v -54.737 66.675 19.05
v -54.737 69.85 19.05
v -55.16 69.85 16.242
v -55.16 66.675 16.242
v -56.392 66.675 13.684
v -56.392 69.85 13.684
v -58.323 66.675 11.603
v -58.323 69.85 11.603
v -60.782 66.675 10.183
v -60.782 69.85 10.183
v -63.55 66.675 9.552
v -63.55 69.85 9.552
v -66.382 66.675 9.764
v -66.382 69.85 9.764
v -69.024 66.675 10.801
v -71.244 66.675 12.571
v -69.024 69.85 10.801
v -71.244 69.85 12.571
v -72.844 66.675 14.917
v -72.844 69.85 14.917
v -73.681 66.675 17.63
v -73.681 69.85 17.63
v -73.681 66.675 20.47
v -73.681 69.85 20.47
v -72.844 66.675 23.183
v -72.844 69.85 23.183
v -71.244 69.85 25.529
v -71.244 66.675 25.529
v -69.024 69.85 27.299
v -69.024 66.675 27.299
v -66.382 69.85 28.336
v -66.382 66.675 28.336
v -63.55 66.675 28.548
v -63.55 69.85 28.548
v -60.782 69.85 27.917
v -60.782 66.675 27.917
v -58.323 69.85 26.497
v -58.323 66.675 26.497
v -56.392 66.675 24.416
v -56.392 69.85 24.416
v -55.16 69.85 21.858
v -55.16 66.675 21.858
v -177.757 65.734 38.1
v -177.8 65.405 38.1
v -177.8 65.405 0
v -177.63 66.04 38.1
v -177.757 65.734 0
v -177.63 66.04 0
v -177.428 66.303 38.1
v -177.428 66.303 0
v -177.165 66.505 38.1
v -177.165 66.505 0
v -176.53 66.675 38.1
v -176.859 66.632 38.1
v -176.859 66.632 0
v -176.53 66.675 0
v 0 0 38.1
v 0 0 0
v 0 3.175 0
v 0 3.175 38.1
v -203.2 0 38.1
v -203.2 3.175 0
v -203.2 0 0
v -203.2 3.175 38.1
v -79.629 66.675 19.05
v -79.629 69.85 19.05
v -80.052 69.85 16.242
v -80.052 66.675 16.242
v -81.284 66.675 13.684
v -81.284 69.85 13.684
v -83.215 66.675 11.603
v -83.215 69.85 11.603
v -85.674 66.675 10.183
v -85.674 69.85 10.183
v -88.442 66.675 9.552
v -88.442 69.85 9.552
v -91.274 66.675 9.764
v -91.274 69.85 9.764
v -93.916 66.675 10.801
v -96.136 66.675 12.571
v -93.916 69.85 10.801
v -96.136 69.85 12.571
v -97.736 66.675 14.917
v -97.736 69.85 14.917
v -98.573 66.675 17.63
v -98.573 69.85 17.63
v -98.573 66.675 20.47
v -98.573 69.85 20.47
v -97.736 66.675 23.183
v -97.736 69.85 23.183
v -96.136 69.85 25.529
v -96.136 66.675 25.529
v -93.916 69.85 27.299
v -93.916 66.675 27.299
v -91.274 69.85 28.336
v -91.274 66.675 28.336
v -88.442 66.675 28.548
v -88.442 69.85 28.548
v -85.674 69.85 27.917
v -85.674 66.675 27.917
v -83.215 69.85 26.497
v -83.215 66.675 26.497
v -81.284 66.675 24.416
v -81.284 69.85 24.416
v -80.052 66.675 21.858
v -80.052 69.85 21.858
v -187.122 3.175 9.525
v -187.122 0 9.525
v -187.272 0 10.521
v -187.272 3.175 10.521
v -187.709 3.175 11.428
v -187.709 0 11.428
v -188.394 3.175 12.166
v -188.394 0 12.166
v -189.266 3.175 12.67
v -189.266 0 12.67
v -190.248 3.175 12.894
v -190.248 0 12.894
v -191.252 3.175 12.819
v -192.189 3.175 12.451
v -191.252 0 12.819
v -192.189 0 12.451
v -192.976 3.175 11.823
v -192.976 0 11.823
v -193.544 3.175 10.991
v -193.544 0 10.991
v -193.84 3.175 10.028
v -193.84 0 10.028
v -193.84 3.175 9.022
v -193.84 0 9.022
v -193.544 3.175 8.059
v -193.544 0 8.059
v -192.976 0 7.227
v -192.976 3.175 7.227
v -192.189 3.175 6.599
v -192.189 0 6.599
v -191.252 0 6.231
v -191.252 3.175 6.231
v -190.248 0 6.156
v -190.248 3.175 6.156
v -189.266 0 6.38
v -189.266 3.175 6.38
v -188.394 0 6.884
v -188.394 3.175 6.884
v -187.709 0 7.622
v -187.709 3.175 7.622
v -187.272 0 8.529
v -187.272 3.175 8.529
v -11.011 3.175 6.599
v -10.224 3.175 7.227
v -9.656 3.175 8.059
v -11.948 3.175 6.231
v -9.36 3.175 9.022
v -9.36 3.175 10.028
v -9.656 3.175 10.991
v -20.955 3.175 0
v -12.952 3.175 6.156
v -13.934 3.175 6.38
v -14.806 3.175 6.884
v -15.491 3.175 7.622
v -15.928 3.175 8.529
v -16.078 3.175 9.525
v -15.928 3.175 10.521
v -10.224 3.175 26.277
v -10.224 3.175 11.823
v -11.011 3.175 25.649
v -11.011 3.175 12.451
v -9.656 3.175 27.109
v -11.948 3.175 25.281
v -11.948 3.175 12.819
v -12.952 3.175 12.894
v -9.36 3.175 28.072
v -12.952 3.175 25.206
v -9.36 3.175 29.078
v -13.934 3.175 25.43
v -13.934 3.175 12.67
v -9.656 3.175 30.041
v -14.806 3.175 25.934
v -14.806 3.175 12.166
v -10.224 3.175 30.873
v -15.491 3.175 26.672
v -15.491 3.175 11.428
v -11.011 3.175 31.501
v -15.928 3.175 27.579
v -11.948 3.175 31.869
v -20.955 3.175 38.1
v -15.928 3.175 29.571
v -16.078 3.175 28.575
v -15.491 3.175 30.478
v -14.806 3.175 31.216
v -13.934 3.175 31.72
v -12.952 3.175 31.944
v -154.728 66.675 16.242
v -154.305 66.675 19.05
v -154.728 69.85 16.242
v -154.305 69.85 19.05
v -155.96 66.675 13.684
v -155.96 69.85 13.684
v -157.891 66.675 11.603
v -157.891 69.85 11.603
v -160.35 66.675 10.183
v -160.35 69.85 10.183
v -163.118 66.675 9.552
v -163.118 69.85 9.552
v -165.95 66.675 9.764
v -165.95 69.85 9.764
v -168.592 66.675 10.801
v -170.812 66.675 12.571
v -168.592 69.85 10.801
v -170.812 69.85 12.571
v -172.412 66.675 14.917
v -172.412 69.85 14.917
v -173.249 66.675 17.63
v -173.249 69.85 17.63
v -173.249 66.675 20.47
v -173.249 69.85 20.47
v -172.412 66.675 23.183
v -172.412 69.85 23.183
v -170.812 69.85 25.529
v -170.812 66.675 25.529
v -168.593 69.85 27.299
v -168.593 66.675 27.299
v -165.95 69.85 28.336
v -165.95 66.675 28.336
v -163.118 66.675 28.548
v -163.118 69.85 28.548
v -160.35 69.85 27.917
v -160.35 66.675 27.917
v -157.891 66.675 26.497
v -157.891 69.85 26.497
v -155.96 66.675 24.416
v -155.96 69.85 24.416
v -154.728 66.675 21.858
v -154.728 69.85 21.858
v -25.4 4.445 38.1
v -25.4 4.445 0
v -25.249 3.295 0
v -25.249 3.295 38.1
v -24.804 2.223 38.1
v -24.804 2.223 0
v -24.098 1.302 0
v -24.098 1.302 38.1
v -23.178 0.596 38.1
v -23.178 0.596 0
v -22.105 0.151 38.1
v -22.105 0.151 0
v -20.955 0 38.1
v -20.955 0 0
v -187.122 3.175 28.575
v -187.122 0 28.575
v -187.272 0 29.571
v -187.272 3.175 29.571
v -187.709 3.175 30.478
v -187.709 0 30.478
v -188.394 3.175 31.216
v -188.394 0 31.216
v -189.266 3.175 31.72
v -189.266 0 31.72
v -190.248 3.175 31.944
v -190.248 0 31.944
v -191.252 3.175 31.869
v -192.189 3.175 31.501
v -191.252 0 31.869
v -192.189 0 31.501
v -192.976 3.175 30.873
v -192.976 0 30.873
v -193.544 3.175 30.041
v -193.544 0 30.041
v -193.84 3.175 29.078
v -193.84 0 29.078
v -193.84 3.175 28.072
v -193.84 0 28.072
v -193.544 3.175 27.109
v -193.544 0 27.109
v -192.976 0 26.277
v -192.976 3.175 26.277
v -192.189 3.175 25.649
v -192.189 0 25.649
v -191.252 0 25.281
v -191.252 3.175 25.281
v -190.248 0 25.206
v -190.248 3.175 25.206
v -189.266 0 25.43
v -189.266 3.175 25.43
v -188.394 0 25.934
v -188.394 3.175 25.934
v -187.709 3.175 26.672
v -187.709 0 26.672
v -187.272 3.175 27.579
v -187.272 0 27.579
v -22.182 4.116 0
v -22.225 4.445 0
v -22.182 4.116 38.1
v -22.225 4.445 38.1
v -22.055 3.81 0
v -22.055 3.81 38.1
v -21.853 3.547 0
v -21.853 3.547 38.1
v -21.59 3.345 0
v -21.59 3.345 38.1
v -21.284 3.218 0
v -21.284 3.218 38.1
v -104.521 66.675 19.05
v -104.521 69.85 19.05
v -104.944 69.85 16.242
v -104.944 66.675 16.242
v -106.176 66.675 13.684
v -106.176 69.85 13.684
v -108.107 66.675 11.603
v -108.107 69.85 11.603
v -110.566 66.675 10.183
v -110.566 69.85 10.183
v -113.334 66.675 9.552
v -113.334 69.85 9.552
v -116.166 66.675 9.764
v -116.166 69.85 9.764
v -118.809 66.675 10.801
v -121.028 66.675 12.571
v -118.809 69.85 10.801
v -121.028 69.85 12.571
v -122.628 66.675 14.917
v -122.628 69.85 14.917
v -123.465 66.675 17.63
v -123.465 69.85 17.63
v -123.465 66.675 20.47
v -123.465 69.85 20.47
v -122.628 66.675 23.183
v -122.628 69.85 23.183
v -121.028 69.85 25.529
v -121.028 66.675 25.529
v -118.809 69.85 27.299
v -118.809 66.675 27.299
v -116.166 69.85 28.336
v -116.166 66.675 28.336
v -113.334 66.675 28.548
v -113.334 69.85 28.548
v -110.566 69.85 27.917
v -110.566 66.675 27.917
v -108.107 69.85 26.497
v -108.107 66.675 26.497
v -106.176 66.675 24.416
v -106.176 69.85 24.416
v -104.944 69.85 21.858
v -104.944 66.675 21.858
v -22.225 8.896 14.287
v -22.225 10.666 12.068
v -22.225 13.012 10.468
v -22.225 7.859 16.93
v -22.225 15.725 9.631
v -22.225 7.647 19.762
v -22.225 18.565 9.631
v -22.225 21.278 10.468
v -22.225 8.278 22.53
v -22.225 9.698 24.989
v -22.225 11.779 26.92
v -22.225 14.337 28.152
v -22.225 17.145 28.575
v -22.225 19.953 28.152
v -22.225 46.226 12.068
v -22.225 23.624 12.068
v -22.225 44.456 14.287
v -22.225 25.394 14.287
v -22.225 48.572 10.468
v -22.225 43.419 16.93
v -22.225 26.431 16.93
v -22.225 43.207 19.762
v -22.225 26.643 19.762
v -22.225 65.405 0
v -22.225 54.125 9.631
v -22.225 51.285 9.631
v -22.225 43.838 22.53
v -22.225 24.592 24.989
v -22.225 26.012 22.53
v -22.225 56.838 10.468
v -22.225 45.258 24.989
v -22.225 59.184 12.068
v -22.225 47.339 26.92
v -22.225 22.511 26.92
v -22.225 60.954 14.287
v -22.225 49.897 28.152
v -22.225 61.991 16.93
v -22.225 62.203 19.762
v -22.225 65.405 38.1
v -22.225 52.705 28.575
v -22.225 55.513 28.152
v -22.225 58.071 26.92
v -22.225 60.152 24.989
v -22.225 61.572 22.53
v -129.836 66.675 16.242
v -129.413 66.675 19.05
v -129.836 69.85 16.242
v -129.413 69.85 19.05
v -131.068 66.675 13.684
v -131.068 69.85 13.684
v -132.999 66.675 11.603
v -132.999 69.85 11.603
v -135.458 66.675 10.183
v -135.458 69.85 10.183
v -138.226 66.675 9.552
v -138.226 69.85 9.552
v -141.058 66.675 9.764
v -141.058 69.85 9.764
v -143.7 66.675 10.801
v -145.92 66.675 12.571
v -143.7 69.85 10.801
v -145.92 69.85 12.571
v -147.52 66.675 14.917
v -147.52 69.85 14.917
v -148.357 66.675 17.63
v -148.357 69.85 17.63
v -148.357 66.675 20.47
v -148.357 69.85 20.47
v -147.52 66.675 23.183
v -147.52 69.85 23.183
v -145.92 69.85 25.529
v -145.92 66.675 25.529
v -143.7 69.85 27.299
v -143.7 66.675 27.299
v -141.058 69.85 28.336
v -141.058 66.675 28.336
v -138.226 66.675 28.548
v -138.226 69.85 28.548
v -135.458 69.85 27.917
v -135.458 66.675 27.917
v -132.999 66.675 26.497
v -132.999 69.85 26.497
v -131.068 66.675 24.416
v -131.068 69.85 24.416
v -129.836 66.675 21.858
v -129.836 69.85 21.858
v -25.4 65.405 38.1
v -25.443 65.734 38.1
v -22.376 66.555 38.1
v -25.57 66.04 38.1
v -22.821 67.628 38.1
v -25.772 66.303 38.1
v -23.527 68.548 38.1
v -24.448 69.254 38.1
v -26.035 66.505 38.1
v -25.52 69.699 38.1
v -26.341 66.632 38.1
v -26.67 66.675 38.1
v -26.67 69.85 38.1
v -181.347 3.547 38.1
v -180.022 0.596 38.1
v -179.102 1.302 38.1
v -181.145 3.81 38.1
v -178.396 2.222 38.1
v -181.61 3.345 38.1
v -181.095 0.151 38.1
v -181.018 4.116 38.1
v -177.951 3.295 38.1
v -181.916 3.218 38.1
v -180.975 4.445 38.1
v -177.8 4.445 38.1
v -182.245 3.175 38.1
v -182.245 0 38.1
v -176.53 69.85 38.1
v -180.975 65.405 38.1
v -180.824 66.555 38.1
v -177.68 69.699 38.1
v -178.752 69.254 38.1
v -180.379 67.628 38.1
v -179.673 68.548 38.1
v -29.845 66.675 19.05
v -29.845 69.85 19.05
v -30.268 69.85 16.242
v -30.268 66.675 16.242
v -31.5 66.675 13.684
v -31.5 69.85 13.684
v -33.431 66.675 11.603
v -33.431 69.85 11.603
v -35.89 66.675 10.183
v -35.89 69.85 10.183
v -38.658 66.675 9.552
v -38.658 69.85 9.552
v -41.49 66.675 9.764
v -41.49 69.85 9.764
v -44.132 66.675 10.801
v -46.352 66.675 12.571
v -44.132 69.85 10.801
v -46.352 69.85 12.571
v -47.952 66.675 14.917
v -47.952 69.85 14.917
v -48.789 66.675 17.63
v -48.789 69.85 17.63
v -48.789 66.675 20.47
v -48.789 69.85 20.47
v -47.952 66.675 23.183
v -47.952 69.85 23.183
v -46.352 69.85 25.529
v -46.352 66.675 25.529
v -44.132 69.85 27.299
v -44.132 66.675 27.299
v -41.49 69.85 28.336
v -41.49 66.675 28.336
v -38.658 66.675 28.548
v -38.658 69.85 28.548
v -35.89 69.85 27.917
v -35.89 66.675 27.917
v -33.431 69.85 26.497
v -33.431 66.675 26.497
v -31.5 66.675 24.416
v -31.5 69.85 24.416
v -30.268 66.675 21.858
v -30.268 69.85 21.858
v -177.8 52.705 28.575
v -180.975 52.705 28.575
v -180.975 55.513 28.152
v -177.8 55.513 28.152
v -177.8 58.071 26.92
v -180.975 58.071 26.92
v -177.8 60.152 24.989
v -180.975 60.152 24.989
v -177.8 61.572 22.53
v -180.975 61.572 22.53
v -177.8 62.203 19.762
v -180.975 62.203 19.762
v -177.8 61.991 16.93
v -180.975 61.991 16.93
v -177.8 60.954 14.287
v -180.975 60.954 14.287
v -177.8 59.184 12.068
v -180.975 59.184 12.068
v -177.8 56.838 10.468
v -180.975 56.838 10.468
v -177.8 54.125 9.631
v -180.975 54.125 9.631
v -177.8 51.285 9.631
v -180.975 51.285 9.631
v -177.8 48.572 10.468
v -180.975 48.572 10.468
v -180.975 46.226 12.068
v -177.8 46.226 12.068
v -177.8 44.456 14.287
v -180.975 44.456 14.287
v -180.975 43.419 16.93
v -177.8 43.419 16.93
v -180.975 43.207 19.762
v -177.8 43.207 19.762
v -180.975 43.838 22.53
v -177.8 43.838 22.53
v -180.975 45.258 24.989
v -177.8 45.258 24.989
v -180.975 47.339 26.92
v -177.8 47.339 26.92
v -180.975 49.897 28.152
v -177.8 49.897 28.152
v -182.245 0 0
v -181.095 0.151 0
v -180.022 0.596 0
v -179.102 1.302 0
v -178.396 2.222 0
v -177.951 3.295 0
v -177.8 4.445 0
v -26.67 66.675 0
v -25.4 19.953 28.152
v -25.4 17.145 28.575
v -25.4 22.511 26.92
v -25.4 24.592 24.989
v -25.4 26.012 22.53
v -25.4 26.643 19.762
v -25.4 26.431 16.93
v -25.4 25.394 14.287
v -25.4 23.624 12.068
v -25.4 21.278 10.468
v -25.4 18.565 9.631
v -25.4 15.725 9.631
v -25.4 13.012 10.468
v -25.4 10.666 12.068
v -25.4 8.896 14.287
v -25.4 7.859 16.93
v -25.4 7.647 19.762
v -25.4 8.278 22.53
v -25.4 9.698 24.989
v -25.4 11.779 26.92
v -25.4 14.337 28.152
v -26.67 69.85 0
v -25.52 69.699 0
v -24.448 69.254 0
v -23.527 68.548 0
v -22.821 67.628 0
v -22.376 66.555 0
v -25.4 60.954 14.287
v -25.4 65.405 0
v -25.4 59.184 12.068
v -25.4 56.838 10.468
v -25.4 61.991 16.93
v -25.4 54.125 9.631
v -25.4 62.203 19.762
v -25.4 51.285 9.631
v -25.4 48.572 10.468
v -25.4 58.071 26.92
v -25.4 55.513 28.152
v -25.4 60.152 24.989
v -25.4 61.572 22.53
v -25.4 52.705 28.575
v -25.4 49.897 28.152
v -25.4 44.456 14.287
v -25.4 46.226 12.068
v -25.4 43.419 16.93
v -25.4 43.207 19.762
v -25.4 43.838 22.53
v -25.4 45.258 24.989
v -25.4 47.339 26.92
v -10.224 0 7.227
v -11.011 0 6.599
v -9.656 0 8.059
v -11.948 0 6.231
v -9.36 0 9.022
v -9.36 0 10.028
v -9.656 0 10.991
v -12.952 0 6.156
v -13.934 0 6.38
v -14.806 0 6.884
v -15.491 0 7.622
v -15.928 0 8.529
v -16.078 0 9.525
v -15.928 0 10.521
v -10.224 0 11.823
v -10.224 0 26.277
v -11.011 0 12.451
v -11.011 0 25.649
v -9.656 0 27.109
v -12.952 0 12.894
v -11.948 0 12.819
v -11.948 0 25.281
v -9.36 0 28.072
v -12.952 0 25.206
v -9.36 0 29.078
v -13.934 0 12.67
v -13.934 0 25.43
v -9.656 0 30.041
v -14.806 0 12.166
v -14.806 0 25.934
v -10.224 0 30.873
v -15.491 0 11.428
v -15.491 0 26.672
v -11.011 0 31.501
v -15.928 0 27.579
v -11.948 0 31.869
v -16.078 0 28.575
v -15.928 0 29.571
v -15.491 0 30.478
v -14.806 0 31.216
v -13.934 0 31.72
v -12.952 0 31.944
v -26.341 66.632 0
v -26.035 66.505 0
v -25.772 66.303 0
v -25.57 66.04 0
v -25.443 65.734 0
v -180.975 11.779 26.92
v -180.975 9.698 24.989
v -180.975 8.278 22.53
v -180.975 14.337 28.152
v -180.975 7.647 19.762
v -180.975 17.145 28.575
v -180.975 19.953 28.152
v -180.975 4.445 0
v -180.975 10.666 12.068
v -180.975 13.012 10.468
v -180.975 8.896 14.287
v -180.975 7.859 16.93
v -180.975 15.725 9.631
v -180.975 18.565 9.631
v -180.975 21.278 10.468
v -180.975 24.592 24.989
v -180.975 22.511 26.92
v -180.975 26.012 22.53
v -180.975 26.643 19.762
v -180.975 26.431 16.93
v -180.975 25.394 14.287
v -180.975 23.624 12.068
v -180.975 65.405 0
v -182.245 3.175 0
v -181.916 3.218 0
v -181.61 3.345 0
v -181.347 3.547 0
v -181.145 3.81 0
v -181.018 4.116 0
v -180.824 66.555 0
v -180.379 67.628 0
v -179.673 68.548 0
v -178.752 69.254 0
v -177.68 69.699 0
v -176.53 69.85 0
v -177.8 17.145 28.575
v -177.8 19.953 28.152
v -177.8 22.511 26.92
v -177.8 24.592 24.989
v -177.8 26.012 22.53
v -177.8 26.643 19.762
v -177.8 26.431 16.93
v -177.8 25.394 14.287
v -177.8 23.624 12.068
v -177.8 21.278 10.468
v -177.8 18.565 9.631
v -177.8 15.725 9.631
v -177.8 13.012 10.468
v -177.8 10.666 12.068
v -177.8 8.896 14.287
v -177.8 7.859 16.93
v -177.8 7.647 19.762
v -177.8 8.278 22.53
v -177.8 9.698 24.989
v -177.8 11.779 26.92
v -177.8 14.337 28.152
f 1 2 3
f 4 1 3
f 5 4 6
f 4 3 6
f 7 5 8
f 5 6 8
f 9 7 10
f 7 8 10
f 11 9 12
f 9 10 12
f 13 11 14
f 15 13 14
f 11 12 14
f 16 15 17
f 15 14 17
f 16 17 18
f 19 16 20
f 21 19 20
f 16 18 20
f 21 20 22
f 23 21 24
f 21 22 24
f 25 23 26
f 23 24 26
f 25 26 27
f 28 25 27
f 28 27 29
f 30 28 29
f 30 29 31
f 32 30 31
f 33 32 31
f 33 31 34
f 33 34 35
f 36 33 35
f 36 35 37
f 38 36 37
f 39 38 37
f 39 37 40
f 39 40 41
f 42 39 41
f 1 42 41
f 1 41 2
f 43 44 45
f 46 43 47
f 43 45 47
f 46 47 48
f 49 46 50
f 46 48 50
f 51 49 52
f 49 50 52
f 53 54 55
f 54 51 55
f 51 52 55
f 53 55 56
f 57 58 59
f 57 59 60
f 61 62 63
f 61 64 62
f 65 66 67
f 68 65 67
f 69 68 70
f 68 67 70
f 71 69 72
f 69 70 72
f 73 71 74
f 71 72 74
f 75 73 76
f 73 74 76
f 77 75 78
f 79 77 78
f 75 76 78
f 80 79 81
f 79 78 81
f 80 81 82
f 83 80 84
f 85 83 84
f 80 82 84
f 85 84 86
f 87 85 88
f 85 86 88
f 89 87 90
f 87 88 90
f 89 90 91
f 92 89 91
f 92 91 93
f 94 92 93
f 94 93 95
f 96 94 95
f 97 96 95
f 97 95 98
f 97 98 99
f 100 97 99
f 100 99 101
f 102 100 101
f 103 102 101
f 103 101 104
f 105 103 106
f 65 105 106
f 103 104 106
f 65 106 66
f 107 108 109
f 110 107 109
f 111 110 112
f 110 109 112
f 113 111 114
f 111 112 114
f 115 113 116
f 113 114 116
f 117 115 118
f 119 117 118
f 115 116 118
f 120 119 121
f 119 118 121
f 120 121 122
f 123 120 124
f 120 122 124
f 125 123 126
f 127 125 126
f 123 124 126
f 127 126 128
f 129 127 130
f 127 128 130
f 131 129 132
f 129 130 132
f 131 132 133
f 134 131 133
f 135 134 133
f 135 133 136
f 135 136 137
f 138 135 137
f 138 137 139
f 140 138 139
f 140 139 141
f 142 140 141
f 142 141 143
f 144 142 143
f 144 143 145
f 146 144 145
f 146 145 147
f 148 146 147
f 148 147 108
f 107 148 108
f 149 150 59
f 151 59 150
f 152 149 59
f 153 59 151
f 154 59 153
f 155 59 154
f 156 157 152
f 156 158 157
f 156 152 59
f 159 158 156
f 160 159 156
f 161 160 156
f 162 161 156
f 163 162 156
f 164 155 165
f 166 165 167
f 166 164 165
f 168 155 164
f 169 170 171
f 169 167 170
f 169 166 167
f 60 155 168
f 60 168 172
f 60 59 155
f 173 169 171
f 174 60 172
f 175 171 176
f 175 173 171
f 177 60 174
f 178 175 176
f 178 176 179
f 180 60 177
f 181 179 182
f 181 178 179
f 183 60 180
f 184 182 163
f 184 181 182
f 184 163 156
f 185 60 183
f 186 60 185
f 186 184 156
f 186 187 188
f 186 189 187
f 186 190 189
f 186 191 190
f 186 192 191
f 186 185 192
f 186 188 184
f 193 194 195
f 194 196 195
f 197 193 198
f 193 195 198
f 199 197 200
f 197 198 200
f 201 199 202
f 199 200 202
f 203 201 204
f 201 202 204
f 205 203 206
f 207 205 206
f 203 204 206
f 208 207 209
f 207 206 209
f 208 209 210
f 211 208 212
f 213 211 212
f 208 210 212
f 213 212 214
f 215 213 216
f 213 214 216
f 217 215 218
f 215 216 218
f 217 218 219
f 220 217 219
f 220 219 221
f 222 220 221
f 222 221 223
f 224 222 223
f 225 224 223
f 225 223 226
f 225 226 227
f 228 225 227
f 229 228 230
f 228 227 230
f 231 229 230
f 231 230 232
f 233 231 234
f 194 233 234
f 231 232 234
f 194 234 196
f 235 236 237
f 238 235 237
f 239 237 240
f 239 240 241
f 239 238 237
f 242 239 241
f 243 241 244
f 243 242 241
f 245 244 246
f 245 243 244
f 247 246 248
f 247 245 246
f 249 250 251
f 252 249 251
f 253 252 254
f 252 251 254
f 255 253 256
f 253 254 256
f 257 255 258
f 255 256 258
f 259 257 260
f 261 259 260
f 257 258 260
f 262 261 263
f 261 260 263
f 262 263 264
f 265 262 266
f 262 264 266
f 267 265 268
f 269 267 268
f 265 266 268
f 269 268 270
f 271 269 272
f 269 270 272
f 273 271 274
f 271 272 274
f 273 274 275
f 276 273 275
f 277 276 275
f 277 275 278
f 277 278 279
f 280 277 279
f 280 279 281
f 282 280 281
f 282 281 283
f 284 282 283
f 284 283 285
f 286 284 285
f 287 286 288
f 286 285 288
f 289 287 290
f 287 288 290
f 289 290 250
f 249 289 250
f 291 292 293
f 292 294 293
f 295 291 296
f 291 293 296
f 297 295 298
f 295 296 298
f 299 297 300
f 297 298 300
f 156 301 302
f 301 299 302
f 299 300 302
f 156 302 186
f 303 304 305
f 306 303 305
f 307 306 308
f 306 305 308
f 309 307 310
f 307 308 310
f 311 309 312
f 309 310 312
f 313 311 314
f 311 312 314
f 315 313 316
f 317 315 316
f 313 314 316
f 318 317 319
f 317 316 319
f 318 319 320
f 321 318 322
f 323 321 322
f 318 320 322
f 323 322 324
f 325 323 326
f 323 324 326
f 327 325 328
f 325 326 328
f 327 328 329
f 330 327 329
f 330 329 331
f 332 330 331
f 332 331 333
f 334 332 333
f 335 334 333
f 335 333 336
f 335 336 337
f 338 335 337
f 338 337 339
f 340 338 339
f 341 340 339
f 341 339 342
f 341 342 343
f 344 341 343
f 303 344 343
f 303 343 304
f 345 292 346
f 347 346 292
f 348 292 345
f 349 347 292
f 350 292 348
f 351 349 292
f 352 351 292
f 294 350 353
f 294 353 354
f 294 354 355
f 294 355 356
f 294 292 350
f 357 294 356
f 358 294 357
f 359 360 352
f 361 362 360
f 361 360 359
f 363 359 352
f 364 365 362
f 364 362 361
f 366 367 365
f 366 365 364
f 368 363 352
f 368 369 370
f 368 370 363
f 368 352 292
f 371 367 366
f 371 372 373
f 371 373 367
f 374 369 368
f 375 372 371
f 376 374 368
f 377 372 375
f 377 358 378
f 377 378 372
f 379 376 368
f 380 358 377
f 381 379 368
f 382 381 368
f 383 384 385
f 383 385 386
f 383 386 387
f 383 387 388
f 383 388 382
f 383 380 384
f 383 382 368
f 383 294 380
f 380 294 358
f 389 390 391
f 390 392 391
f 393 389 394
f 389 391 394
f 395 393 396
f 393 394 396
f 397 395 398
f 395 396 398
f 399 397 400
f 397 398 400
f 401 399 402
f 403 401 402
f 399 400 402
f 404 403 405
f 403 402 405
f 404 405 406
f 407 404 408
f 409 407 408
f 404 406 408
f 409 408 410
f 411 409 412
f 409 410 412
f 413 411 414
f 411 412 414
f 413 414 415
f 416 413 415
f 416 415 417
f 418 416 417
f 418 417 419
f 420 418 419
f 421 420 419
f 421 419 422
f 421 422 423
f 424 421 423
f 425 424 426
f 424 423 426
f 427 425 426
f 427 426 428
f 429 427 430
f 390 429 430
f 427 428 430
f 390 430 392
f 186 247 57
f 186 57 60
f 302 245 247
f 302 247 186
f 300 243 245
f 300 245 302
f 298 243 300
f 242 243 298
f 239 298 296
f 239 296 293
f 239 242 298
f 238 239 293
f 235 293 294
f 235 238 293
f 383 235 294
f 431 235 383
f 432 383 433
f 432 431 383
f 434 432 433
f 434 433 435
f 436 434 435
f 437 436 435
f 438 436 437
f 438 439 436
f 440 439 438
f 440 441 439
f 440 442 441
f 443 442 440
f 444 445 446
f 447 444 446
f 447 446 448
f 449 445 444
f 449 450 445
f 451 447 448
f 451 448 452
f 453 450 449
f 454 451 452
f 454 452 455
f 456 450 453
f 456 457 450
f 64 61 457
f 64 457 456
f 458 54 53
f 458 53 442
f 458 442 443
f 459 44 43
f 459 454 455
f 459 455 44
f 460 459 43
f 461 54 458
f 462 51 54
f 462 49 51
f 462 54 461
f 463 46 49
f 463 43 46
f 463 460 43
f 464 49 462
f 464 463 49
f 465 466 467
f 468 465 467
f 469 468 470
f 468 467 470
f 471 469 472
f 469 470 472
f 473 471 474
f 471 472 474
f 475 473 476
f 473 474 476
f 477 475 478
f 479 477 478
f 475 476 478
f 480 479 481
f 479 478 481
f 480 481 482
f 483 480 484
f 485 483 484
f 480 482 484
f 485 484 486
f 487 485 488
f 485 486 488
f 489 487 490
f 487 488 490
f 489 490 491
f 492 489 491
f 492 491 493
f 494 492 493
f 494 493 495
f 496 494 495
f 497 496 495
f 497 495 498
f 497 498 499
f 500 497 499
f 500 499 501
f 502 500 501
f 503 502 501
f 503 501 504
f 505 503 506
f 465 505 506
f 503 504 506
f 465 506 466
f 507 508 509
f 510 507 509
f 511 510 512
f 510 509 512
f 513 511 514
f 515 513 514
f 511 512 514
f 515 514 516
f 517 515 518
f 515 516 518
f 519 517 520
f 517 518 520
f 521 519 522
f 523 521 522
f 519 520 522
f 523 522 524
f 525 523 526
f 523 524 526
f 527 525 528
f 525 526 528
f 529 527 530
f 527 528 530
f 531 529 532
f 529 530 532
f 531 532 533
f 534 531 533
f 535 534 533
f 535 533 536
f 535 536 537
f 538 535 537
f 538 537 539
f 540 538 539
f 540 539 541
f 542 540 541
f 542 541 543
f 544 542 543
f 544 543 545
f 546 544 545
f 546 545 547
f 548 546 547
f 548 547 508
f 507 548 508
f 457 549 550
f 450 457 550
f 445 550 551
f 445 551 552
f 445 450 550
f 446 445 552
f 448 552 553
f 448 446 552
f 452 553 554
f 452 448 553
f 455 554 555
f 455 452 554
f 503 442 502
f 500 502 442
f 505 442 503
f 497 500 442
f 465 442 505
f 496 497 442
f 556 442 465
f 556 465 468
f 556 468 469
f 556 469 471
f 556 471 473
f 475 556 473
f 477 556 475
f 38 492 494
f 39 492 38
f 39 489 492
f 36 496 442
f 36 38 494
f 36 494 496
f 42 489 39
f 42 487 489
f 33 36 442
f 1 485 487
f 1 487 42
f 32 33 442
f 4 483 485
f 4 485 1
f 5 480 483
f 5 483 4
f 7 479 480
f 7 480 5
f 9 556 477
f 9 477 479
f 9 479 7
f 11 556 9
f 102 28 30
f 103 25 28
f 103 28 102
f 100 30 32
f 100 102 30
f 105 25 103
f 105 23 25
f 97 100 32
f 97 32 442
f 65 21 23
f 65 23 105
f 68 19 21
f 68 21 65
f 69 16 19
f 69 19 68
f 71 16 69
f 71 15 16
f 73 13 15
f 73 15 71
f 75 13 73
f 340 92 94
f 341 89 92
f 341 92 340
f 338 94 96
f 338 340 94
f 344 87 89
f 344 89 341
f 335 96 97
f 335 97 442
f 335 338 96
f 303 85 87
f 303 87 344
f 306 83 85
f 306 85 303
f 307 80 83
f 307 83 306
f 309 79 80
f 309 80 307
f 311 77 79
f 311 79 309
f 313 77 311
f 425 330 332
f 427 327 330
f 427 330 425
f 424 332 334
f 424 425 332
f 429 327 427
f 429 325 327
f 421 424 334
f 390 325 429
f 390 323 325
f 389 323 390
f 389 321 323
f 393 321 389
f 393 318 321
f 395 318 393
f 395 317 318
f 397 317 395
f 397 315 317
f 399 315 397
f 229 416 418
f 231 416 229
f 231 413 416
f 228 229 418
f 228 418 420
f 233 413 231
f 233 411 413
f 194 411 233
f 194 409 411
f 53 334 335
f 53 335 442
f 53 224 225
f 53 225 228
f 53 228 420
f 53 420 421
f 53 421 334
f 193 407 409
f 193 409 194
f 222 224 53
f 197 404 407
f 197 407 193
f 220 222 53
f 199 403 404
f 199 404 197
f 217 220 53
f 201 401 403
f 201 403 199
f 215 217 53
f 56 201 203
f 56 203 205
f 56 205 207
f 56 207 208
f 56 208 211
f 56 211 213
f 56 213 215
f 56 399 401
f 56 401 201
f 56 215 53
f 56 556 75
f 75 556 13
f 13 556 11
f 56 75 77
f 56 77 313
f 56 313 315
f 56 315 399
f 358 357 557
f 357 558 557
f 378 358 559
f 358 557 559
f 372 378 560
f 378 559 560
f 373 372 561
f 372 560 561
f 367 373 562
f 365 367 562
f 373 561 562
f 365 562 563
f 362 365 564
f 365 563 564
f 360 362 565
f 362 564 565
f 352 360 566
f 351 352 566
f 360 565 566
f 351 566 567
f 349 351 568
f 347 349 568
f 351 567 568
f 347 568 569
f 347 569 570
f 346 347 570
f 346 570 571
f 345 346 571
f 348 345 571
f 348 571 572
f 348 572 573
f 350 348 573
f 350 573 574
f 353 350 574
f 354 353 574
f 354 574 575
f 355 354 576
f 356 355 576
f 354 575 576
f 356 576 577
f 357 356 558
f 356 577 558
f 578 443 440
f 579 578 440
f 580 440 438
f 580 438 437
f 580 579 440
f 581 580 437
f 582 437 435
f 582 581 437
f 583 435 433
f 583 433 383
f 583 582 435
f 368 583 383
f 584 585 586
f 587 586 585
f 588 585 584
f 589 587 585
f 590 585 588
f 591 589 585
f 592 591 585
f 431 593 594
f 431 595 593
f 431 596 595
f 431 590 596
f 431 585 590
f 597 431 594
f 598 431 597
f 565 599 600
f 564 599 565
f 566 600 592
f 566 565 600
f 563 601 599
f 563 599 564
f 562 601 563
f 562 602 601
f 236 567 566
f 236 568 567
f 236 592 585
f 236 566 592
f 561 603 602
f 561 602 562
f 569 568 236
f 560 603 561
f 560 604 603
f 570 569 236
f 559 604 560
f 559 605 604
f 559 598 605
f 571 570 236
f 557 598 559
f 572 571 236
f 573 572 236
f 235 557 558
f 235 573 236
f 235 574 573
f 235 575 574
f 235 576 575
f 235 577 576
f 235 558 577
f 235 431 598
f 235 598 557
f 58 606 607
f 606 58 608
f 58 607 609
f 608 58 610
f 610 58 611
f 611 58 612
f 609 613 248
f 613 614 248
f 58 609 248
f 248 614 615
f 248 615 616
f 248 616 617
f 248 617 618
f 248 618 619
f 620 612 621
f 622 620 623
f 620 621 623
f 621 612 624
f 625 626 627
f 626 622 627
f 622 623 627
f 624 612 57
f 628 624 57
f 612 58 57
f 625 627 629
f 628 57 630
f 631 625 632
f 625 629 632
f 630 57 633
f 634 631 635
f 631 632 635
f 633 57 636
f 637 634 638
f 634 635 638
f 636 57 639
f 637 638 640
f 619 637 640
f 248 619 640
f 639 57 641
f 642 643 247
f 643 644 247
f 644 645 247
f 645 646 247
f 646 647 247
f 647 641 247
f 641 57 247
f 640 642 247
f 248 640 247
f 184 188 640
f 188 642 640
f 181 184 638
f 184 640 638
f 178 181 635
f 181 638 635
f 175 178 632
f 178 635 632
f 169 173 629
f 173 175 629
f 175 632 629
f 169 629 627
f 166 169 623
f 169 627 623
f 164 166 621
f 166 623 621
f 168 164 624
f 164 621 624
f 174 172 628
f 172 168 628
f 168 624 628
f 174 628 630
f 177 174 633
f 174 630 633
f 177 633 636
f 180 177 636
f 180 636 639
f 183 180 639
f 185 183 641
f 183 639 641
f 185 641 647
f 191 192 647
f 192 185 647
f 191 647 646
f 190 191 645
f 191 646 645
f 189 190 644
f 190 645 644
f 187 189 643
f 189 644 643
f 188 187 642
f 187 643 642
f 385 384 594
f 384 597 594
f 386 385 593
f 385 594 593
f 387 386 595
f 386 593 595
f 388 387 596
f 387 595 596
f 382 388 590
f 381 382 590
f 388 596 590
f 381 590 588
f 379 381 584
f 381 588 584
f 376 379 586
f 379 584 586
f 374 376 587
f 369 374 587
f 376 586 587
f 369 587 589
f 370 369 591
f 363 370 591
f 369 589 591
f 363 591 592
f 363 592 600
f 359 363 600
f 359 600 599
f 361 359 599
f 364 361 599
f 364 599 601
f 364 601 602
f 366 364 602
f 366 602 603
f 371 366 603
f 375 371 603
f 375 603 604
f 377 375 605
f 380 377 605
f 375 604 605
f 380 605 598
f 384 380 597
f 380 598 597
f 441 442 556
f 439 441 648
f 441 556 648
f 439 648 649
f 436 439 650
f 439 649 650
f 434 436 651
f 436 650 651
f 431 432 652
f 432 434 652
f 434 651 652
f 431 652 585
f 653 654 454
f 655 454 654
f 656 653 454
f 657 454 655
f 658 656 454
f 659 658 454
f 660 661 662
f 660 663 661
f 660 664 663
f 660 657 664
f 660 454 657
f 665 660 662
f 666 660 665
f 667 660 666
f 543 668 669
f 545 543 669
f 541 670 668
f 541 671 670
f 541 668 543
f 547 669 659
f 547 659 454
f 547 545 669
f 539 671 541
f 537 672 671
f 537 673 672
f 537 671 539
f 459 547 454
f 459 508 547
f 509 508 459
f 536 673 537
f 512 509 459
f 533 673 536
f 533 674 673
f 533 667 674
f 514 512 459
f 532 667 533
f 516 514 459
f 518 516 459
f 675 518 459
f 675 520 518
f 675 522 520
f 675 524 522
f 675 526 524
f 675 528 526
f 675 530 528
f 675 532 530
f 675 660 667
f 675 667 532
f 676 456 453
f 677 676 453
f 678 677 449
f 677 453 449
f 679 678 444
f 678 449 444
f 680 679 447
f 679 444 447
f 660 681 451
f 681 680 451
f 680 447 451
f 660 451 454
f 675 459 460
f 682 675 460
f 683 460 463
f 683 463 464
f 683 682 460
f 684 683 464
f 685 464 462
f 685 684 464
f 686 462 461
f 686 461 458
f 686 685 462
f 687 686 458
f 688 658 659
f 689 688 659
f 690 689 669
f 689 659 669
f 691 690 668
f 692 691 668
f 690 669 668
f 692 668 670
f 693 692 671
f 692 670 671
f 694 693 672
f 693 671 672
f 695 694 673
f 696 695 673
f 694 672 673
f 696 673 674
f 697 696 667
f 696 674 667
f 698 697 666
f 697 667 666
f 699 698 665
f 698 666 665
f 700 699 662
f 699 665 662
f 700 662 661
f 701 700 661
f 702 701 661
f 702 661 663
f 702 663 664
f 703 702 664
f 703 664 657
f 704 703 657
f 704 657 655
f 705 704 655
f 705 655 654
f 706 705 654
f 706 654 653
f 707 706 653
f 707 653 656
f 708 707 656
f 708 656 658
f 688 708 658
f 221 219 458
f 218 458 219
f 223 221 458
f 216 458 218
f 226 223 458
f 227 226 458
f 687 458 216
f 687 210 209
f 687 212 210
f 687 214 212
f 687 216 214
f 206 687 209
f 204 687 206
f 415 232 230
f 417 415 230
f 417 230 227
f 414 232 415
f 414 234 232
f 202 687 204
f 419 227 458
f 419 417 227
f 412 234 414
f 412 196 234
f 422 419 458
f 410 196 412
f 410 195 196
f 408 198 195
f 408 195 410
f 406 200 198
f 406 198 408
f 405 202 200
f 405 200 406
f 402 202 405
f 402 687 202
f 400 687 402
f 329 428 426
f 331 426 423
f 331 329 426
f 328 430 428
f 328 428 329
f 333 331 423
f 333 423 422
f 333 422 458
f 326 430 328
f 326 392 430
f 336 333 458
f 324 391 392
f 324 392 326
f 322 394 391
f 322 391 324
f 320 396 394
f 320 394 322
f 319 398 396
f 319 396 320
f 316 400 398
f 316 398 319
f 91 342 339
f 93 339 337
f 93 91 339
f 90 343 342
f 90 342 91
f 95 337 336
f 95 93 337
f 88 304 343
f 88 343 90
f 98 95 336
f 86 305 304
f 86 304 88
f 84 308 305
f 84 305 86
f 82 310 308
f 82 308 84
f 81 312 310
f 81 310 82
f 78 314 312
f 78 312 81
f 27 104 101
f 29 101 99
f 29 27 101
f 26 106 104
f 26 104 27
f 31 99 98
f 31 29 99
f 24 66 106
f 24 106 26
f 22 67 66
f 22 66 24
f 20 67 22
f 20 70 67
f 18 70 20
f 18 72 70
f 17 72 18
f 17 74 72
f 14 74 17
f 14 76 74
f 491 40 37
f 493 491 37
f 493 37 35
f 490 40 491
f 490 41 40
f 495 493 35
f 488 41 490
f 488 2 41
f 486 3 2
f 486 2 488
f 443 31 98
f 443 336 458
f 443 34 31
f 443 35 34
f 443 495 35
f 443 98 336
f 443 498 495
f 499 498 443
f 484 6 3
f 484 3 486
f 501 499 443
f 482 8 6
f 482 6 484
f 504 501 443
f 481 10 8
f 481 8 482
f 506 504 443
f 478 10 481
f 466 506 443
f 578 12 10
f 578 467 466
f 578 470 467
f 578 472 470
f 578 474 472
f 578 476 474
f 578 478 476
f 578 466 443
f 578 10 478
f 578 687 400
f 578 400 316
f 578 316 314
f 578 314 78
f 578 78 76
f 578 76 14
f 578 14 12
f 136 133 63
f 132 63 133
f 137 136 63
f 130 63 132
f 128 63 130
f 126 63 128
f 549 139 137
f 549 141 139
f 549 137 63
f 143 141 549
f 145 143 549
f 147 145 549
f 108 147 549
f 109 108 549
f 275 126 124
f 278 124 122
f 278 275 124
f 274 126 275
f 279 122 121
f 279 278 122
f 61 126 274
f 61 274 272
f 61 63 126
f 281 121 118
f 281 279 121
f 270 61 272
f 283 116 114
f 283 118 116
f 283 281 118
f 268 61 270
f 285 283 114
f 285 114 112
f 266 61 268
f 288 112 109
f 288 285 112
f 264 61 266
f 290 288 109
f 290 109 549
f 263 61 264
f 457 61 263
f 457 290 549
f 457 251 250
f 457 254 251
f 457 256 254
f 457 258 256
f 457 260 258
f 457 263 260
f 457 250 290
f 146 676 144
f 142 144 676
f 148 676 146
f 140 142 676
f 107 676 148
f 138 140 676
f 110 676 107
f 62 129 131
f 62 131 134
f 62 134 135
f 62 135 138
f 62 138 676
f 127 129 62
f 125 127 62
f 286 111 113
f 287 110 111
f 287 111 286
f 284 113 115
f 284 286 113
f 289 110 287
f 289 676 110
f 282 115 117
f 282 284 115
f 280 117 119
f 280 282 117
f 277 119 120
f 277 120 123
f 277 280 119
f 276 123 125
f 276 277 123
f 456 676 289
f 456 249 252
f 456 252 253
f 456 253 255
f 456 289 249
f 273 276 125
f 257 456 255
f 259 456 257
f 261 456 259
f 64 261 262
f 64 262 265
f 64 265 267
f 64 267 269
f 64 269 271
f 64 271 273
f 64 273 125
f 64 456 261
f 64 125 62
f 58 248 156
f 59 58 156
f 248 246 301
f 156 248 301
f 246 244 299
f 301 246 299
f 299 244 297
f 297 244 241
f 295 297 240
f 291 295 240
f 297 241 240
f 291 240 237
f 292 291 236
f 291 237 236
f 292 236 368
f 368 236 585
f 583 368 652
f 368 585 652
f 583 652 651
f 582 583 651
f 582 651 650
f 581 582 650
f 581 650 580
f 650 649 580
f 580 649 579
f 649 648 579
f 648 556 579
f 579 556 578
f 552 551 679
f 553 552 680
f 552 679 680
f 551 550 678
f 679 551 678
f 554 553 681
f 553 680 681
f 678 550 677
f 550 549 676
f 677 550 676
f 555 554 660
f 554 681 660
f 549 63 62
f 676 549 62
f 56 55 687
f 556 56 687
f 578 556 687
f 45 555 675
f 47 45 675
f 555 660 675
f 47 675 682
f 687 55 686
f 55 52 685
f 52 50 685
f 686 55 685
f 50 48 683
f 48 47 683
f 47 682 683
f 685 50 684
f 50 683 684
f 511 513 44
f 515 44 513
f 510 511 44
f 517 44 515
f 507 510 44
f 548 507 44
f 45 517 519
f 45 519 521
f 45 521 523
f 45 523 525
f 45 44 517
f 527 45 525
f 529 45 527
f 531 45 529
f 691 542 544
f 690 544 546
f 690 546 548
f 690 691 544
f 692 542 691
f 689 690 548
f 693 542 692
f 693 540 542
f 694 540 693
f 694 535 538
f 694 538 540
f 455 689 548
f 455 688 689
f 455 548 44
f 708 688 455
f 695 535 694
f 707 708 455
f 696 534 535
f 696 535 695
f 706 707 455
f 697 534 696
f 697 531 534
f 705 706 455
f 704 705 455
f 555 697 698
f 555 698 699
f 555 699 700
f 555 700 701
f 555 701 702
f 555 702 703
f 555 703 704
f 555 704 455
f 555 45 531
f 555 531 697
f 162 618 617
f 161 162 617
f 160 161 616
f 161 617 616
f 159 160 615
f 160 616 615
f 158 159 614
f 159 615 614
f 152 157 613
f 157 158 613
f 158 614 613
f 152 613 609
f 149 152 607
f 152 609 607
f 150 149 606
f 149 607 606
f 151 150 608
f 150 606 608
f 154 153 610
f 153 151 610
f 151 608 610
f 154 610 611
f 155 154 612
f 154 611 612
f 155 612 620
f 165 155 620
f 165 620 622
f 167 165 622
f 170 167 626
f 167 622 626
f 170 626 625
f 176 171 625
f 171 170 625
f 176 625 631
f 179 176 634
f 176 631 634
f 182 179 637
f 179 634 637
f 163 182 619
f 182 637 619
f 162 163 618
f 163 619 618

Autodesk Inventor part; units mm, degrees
ref_plane "YZ Plane" through (0, 0, 0) normal (1, 0, 0) x (0, 1, 0)
ref_plane "XZ Plane" through (0, 0, 0) normal (0, 1, 0) x (-1, 0, 0)
ref_plane "XY Plane" through (0, 0, 0) normal (0, 0, 1) x (1, 0, 0)
sketch "Sketch1" plane through (0, 0, 0) normal (0, 1, 0) x (-1, 0, 0)
  line L0 (0, 0) -> (0, 38.1)
  line L1 (0, 38.1) -> (25.4, 38.1)
  line L2 (25.4, 38.1) -> (25.4, 0)
  line L3 (25.4, 0) -> (0, 0)
  line L4 (12.7, 38.1) -> (12.7, 0) construction
  circle A0 centre (12.7, 28.575) radius 3.3782
  circle A1 centre (12.7, 9.525) radius 3.3782
  dimension "d0" = 38.1
  dimension "d1" = 25.4
  dimension "d2" = 6.7564
  dimension "d3" = 19.05
  dimension "d4" = 9.525
extrude "Plate1" add sketch "Sketch1" along normal blind 3.175
sketch "Sketch2" plane through (-22.225, 0, 38.1) normal (-1, 0, 0) x (0, -1, 0)
  line L0 (0, -38.1) -> (0, 0)
  line L1 (0, 0) -> (-69.85, 0)
  line L2 (-69.85, 0) -> (-69.85, -38.1)
  line L3 (-69.85, -38.1) -> (0, -38.1)
edge flange "Flange1" height 69.85 angle 90 thickness 3.175 bend radius 1.27 thickness toward (-1, 0, 0) relief tear relief width 3.175 relief depth 1.5875 edges at (-25.4, 3.175, 19.05) wall of the first edge with corners at (-22.225, 0, 0) (-22.225, 0, 38.1) (-22.225, 69.85, 38.1) (-22.225, 69.85, 0)
bend "Bend1"
corner "Corner1"
sketch "Sketch3" plane through (-22.225, 66.675, 0) normal (0, 1, 0) x (-1, 0, 0)
  line L0 (0, 38.1) -> (0, 0)
  line L1 (0, 0) -> (158.75, 0)
  line L2 (158.75, 0) -> (158.75, 38.1)
  line L3 (158.75, 38.1) -> (0, 38.1)
edge flange "Flange2" height 158.75 angle 90 thickness 3.175 bend radius 1.27 thickness toward (0, 1, 0) relief tear relief width 3.175 relief depth 1.5875 edges at (-25.4, 69.85, 19.05) wall of the first edge with corners at (-22.225, 66.675, 38.1) (-22.225, 66.675, 0) (-180.975, 66.675, 0) (-180.975, 66.675, 38.1)
bend "Bend2"
corner "Corner2"
sketch "Sketch4" plane through (-177.8, 69.85, 0) normal (-1, 0, 0) x (0, -1, 0)
  line L0 (0, 38.1) -> (0, 0)
  line L1 (0, 0) -> (69.85, 0)
  line L2 (69.85, 0) -> (69.85, 38.1)
  line L3 (69.85, 38.1) -> (0, 38.1)
edge flange "Flange3" height 69.85 angle 90 thickness 3.175 bend radius 1.27 thickness toward (-1, 0, 0) relief tear relief width 3.175 relief depth 1.5875 edges at (-180.975, 66.675, 19.05) wall of the first edge with corners at (-177.8, 69.85, 38.1) (-177.8, 69.85, 0) (-177.8, 0, 0) (-177.8, 0, 38.1)
bend "Bend3"
corner "Corner3"
sketch "Sketch5" plane through (-177.8, 3.175, 38.1) normal (0, -1, 0) x (1, 0, 0)
  line L0 (0, -38.1) -> (0, 0)
  line L1 (0, 0) -> (-25.4, 0)
  line L2 (-25.4, 0) -> (-25.4, -38.1)
  line L3 (-25.4, -38.1) -> (0, -38.1)
edge flange "Flange4" height 25.4 angle 90 thickness 3.175 bend radius 1.27 thickness toward (0, -1, 0) relief tear relief width 3.175 relief depth 1.5875 edges at (-180.975, 0, 19.05) wall of the first edge with corners at (-177.8, 3.175, 0) (-177.8, 3.175, 38.1) (-203.2, 3.175, 38.1) (-203.2, 3.175, 0)
bend "Bend4"
corner "Corner4"
sketch "Sketch6" plane through (-203.2, 0, 0) normal (0, -1, 0) x (1, 0, 0)
  line L0 (0, 38.1) -> (20.955, 38.1) projected
  line L1 (0, 0) -> (0, 38.1) projected
  line L2 (20.955, 0) -> (0, 0) projected
  line L3 (12.7, 38.1) -> (12.7, 0) construction
  circle A0 centre (12.7, 28.575) radius 3.3782
  circle A1 centre (12.7, 9.525) radius 3.3782
  point P0 (203.2, 0)
  dimension "d46" = 12.7
  dimension "d47" = 6.7564
  dimension "d48" = 19.05
  dimension "d49" = 9.525
extrude "Cut1" cut sketch "Sketch6" against normal blind 3.175
sketch "Sketch7" plane through (-26.67, 69.85, 38.1) normal (0, 1, 0) x (1, 0, 0)
  line L0 (-149.86, 38.1) -> (-149.86, 0) projected
  line L1 (0, 0) -> (0, 38.1) projected
  circle A0 centre (-137.16, 19.05) radius 9.525
  line L2 (-149.86, 19.05) -> (0, 19.05) construction
  circle A1 centre (-112.268, 19.05) radius 9.525
  circle A2 centre (-87.376, 19.05) radius 9.525
  circle A3 centre (-62.484, 19.05) radius 9.525
  circle A4 centre (-37.592, 19.05) radius 9.525
  circle A5 centre (-12.7, 19.05) radius 9.525
  point P0 (26.67, 38.1)
  dimension "d52" = 149.86
  dimension "d53" = 12.7
  dimension "d56" = 24.892
  dimension "d61" = 19.05
extrude "Cut2" cut sketch "Sketch7" against normal blind 3.175
sketch "Sketch8" plane through (-180.975, 65.405, 0) normal (-1, 0, 0) x (0, 0, 1)
  line L0 (0, -60.96) -> (38.1, -60.96) projected
  line L1 (38.1, 0) -> (0, 0) projected
  line L2 (19.05, 0) -> (19.05, -60.96) construction
  circle A0 centre (19.05, -12.7) radius 9.525
  circle A1 centre (19.05, -48.26) radius 9.525
  point P0 (0, -65.405)
  dimension "d64" = 19.05
  dimension "d66" = 12.7
  dimension "d67" = 12.7
extrude "Cut3" cut sketch "Sketch8" against normal blind 5080
equation "\"d50\" = Thickness"
equation "\"d56\" = -0.4 * d53 + 0.2 * d52"
equation "\"d62\" = Thickness"
equation "\"d6\" = BendReliefWidth"
equation "\"d7\" = BendReliefDepth"
equation "\"d8\" = MinimumRemnant"
equation "\"d9\" = BendRadius"
equation "\"d13\" = CornerReliefSize"
equation "\"d14\" = GapSize"
equation "\"d15\" = JacobiRadiusSize"
equation "\"d16\" = BendReliefWidth"
equation "\"d17\" = BendReliefDepth"
equation "\"d18\" = MinimumRemnant"
equation "\"d19\" = BendRadius"
equation "\"d23\" = CornerReliefSize"
equation "\"d24\" = GapSize"
equation "\"d25\" = JacobiRadiusSize"
equation "\"d26\" = BendReliefWidth"
equation "\"d27\" = BendReliefDepth"
equation "\"d28\" = MinimumRemnant"
equation "\"d29\" = BendRadius"
equation "\"d33\" = CornerReliefSize"
equation "\"d34\" = GapSize"
equation "\"d35\" = JacobiRadiusSize"
equation "\"d36\" = BendReliefWidth"
equation "\"d37\" = BendReliefDepth"
equation "\"d38\" = MinimumRemnant"
equation "\"d39\" = BendRadius"
equation "\"d43\" = CornerReliefSize"
equation "\"d44\" = GapSize"
equation "\"d45\" = JacobiRadiusSize"
equation "\"BendRadius\" = Thickness"
equation "\"BendReliefWidth\" = Thickness"
equation "\"BendReliefDepth\" = 0.5 * Thickness"
equation "\"CornerReliefSize\" = 4 * Thickness"
equation "\"MinimumRemnant\" = 2 * Thickness"
equation "\"TransitionRadius\" = BendRadius"
equation "\"JacobiRadiusSize\" = BendRadius"
equation "\"GapSize\" = Thickness"
equation "\"d5\" = BendRadius"
equation "\"Thickness\" = 3.175"
properties part number "M - Lower Rail Connector Bracket 1" material "Aluminum 6061"
